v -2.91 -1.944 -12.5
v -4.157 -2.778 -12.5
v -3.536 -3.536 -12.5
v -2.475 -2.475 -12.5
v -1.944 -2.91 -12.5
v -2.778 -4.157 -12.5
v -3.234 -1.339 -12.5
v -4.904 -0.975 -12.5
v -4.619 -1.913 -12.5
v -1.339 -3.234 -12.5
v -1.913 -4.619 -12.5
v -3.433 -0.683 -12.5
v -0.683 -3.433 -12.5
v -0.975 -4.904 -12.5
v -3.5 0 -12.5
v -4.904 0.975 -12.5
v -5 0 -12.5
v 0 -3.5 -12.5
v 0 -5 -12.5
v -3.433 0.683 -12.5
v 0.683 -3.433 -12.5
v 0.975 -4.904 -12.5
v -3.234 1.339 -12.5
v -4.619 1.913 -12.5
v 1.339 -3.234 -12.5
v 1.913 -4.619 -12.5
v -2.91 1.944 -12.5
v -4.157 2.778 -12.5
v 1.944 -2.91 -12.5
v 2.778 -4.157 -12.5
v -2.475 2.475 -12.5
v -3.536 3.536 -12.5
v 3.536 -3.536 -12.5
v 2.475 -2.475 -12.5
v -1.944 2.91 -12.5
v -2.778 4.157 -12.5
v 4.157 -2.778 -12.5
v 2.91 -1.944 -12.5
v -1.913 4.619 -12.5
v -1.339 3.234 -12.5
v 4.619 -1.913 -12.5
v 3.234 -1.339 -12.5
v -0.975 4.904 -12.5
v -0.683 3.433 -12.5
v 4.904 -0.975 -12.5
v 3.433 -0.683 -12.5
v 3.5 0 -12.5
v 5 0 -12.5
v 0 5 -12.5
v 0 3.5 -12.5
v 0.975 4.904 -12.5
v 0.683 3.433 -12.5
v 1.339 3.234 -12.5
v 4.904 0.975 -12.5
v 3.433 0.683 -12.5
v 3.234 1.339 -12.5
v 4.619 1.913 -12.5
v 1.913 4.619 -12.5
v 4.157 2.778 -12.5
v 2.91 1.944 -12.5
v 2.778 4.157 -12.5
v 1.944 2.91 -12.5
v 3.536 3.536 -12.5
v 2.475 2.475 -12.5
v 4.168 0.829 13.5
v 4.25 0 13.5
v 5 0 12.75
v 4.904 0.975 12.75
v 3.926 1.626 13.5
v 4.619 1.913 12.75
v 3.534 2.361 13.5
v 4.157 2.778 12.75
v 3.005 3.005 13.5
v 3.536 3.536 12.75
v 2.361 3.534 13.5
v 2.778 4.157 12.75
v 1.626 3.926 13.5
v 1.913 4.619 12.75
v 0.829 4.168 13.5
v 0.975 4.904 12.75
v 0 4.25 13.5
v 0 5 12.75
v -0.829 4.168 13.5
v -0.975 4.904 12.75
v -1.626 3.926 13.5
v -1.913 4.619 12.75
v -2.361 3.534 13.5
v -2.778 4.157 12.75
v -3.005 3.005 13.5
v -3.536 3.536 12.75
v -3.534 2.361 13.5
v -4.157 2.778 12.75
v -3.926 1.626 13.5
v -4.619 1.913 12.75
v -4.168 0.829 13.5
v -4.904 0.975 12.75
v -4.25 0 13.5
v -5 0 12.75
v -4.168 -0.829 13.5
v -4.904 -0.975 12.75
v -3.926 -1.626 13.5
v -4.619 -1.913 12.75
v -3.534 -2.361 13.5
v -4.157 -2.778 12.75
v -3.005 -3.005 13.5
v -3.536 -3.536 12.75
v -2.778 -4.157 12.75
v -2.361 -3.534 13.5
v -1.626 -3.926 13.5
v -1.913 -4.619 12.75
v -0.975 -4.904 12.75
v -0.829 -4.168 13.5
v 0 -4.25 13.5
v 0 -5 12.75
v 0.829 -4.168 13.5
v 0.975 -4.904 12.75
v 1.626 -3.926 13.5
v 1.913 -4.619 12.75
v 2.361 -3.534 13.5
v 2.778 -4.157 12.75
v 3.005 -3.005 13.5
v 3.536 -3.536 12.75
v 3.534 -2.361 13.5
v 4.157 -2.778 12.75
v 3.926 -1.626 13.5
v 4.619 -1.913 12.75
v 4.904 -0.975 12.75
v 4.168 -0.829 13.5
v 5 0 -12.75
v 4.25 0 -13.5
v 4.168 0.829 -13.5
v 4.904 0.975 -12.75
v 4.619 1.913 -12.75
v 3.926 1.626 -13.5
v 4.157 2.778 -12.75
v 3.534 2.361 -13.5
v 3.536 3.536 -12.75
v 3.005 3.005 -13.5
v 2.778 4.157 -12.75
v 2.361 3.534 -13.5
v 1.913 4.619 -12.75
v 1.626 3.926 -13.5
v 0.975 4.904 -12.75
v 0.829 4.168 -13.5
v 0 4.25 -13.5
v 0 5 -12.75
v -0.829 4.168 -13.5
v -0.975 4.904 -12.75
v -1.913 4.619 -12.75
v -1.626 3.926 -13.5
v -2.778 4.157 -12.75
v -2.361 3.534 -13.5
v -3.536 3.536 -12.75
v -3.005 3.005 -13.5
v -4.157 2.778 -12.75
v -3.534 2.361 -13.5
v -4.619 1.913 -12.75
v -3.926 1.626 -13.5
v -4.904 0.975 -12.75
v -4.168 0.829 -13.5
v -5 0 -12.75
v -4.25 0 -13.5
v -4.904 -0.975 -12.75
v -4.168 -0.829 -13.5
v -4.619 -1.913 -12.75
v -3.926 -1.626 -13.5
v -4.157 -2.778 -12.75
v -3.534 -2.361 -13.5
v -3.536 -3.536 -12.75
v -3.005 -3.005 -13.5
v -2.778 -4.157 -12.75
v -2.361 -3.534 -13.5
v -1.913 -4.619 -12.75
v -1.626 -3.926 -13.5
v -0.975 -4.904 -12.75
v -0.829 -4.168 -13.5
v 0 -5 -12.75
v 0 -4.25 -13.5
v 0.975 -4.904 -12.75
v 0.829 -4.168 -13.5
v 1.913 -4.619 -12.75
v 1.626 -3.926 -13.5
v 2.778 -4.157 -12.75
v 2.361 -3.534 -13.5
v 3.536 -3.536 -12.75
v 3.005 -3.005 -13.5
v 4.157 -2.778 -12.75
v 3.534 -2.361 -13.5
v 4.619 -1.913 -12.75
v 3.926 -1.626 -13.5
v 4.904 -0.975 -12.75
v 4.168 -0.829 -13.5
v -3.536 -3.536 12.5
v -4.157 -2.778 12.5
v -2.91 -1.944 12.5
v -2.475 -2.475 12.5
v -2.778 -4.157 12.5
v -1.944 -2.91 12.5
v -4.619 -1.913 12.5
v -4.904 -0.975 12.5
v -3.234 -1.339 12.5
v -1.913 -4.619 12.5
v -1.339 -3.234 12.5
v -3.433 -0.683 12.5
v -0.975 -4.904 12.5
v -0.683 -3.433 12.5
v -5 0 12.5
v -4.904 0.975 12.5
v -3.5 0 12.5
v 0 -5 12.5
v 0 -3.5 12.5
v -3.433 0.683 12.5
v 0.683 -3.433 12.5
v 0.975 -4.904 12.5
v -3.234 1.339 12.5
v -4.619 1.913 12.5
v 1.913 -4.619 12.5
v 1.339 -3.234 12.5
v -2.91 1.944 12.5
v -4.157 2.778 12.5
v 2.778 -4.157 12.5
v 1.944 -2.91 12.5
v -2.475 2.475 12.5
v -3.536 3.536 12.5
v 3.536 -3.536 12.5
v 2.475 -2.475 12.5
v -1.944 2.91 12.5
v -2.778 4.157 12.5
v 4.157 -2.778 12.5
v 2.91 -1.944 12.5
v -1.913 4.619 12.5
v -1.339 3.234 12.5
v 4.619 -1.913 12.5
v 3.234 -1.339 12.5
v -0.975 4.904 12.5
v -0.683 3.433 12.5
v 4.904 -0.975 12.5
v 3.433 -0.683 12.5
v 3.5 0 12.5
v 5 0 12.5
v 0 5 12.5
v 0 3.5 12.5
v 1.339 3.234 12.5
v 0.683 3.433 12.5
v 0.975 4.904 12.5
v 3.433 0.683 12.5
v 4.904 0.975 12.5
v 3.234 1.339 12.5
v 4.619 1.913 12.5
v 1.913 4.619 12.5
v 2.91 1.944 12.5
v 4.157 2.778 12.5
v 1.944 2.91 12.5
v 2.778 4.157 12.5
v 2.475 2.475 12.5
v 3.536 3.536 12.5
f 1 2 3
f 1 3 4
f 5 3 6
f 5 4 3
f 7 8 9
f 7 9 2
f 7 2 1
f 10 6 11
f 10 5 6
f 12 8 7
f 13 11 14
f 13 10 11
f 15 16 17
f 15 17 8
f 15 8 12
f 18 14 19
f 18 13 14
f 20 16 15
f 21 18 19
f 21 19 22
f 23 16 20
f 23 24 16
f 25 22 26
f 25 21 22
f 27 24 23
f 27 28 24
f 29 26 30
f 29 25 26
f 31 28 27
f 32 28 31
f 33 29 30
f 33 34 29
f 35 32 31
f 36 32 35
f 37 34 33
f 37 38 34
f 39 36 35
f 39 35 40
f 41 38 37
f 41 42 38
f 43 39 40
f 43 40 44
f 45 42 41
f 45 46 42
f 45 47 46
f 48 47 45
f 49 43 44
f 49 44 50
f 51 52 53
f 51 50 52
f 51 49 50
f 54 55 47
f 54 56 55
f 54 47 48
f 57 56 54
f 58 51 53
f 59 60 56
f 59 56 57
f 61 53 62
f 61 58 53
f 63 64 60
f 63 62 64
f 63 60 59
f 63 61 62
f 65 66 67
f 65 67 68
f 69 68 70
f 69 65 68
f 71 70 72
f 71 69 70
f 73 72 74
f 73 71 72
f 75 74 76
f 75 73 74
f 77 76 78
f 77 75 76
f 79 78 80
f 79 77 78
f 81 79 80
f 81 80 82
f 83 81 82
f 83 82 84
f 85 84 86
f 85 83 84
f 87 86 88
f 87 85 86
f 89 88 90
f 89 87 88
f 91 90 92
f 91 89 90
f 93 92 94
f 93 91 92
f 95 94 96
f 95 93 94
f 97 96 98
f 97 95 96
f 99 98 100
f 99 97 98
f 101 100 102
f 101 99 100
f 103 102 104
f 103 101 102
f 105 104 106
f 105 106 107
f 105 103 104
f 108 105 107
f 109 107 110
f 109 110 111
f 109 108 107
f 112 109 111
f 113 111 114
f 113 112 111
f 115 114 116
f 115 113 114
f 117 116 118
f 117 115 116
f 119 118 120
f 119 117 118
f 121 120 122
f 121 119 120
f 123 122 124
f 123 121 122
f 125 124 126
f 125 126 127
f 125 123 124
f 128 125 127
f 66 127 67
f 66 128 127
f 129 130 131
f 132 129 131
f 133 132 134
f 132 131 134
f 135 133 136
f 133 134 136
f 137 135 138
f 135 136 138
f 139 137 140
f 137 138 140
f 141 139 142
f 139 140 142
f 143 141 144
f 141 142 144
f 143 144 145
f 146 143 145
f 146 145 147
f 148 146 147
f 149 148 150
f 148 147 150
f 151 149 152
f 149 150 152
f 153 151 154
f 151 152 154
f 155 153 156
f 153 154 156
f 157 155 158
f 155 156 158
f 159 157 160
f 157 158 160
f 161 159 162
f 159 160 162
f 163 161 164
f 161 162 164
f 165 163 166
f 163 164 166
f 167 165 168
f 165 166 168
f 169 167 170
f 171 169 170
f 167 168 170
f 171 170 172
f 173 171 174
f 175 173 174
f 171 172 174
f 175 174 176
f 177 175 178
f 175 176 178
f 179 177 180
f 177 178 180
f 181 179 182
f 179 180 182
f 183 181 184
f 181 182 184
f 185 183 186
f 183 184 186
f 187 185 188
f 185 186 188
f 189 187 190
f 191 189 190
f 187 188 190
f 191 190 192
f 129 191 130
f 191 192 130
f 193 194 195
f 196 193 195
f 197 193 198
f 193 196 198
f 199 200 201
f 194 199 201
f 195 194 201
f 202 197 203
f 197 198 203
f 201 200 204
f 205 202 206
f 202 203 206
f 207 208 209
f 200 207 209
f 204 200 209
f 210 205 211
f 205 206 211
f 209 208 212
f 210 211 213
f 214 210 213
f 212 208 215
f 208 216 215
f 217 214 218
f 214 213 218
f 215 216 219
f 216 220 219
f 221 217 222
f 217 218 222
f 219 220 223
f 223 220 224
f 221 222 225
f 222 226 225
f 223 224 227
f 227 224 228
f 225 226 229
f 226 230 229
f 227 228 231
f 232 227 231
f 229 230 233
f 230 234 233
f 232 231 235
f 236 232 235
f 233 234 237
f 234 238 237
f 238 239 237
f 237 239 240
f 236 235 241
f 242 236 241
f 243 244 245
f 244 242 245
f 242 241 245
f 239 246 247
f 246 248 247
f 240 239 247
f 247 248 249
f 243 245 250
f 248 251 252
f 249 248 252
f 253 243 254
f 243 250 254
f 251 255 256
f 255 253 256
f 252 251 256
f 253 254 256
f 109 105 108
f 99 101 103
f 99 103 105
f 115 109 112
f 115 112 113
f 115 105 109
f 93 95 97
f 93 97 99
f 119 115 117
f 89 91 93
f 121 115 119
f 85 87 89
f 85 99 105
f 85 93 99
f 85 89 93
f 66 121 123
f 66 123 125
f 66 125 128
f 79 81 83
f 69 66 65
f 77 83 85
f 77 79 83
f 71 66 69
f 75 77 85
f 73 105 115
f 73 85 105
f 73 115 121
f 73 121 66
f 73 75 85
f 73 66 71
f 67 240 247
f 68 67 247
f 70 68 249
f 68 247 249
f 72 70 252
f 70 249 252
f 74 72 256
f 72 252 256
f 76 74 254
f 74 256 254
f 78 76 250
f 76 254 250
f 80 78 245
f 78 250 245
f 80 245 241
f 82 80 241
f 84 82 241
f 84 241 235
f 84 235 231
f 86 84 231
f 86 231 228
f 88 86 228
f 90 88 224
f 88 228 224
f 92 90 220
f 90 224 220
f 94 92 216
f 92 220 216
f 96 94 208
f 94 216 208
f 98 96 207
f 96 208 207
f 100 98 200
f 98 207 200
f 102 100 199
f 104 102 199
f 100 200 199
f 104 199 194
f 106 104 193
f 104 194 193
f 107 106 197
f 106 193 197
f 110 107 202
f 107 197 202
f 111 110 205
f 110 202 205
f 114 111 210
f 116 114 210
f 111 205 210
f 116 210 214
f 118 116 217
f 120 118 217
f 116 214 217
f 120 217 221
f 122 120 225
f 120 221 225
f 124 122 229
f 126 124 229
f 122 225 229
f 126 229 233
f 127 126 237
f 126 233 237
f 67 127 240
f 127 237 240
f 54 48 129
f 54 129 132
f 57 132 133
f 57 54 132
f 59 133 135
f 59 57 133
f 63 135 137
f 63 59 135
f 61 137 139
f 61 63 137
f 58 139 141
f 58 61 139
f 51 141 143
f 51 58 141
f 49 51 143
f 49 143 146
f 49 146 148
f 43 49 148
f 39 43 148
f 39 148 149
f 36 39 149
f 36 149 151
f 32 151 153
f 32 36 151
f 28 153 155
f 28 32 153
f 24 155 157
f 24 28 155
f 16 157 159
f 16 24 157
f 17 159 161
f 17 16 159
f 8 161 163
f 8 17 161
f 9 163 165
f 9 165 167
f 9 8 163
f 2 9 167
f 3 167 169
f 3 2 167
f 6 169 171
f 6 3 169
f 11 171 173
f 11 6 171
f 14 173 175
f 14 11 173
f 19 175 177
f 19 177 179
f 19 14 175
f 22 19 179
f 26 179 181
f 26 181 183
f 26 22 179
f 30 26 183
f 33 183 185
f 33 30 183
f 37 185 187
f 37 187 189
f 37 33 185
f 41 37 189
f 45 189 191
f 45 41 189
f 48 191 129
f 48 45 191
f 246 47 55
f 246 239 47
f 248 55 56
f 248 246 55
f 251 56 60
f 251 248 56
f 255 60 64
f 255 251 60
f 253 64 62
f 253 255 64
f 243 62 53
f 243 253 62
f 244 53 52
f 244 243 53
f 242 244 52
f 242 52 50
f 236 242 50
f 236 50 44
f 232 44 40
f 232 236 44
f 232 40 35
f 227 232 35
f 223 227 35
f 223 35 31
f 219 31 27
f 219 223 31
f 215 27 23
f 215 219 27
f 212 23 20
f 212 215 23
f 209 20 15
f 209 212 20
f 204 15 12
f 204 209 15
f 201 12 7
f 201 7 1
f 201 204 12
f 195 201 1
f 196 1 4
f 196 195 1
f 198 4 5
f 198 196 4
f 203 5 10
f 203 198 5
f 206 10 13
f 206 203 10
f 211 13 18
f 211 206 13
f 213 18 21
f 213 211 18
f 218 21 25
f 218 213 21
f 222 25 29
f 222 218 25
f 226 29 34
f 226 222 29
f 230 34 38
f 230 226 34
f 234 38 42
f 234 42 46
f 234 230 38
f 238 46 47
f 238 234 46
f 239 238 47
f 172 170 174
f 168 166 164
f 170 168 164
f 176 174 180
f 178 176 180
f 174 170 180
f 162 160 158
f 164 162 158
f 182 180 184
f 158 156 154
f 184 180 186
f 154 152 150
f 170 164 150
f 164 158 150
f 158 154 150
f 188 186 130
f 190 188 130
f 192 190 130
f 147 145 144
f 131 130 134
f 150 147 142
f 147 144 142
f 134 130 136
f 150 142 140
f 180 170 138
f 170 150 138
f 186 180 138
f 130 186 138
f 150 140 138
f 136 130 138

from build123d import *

# Parameters (mm, degrees)
SKETCH1_R           = 3.5
BOSS_EXTRUDE1_DEPTH = 12.5
SKETCH2_R           = 5
BOSS_EXTRUDE2_DEPTH = 1
CHAMFER1_SIZE       = 0.75


with BuildPart() as part:
    # Sketch1 → Boss-Extrude1 (new body, symmetric)
    with BuildSketch(Plane.XY):
        Circle(SKETCH1_R)
    extrude(amount=BOSS_EXTRUDE1_DEPTH, both=True)

    # Sketch2 → Boss-Extrude2 (add)
    with BuildSketch(Plane.XY.offset(12.5)):
        Circle(SKETCH2_R)
    boss_extrude2 = extrude(amount=BOSS_EXTRUDE2_DEPTH)

    # Mirror1: Boss-Extrude2 across plane
    add(boss_extrude2.mirror(Plane.XY))

    # Chamfer1
    chamfer1_edges = [part.edges().sort_by_distance(p)[0] for p in [
        (-5, 0, 13.5),
        (-5, 0, -13.5),
    ]]
    chamfer(chamfer1_edges, length=CHAMFER1_SIZE)


solid = part.part
